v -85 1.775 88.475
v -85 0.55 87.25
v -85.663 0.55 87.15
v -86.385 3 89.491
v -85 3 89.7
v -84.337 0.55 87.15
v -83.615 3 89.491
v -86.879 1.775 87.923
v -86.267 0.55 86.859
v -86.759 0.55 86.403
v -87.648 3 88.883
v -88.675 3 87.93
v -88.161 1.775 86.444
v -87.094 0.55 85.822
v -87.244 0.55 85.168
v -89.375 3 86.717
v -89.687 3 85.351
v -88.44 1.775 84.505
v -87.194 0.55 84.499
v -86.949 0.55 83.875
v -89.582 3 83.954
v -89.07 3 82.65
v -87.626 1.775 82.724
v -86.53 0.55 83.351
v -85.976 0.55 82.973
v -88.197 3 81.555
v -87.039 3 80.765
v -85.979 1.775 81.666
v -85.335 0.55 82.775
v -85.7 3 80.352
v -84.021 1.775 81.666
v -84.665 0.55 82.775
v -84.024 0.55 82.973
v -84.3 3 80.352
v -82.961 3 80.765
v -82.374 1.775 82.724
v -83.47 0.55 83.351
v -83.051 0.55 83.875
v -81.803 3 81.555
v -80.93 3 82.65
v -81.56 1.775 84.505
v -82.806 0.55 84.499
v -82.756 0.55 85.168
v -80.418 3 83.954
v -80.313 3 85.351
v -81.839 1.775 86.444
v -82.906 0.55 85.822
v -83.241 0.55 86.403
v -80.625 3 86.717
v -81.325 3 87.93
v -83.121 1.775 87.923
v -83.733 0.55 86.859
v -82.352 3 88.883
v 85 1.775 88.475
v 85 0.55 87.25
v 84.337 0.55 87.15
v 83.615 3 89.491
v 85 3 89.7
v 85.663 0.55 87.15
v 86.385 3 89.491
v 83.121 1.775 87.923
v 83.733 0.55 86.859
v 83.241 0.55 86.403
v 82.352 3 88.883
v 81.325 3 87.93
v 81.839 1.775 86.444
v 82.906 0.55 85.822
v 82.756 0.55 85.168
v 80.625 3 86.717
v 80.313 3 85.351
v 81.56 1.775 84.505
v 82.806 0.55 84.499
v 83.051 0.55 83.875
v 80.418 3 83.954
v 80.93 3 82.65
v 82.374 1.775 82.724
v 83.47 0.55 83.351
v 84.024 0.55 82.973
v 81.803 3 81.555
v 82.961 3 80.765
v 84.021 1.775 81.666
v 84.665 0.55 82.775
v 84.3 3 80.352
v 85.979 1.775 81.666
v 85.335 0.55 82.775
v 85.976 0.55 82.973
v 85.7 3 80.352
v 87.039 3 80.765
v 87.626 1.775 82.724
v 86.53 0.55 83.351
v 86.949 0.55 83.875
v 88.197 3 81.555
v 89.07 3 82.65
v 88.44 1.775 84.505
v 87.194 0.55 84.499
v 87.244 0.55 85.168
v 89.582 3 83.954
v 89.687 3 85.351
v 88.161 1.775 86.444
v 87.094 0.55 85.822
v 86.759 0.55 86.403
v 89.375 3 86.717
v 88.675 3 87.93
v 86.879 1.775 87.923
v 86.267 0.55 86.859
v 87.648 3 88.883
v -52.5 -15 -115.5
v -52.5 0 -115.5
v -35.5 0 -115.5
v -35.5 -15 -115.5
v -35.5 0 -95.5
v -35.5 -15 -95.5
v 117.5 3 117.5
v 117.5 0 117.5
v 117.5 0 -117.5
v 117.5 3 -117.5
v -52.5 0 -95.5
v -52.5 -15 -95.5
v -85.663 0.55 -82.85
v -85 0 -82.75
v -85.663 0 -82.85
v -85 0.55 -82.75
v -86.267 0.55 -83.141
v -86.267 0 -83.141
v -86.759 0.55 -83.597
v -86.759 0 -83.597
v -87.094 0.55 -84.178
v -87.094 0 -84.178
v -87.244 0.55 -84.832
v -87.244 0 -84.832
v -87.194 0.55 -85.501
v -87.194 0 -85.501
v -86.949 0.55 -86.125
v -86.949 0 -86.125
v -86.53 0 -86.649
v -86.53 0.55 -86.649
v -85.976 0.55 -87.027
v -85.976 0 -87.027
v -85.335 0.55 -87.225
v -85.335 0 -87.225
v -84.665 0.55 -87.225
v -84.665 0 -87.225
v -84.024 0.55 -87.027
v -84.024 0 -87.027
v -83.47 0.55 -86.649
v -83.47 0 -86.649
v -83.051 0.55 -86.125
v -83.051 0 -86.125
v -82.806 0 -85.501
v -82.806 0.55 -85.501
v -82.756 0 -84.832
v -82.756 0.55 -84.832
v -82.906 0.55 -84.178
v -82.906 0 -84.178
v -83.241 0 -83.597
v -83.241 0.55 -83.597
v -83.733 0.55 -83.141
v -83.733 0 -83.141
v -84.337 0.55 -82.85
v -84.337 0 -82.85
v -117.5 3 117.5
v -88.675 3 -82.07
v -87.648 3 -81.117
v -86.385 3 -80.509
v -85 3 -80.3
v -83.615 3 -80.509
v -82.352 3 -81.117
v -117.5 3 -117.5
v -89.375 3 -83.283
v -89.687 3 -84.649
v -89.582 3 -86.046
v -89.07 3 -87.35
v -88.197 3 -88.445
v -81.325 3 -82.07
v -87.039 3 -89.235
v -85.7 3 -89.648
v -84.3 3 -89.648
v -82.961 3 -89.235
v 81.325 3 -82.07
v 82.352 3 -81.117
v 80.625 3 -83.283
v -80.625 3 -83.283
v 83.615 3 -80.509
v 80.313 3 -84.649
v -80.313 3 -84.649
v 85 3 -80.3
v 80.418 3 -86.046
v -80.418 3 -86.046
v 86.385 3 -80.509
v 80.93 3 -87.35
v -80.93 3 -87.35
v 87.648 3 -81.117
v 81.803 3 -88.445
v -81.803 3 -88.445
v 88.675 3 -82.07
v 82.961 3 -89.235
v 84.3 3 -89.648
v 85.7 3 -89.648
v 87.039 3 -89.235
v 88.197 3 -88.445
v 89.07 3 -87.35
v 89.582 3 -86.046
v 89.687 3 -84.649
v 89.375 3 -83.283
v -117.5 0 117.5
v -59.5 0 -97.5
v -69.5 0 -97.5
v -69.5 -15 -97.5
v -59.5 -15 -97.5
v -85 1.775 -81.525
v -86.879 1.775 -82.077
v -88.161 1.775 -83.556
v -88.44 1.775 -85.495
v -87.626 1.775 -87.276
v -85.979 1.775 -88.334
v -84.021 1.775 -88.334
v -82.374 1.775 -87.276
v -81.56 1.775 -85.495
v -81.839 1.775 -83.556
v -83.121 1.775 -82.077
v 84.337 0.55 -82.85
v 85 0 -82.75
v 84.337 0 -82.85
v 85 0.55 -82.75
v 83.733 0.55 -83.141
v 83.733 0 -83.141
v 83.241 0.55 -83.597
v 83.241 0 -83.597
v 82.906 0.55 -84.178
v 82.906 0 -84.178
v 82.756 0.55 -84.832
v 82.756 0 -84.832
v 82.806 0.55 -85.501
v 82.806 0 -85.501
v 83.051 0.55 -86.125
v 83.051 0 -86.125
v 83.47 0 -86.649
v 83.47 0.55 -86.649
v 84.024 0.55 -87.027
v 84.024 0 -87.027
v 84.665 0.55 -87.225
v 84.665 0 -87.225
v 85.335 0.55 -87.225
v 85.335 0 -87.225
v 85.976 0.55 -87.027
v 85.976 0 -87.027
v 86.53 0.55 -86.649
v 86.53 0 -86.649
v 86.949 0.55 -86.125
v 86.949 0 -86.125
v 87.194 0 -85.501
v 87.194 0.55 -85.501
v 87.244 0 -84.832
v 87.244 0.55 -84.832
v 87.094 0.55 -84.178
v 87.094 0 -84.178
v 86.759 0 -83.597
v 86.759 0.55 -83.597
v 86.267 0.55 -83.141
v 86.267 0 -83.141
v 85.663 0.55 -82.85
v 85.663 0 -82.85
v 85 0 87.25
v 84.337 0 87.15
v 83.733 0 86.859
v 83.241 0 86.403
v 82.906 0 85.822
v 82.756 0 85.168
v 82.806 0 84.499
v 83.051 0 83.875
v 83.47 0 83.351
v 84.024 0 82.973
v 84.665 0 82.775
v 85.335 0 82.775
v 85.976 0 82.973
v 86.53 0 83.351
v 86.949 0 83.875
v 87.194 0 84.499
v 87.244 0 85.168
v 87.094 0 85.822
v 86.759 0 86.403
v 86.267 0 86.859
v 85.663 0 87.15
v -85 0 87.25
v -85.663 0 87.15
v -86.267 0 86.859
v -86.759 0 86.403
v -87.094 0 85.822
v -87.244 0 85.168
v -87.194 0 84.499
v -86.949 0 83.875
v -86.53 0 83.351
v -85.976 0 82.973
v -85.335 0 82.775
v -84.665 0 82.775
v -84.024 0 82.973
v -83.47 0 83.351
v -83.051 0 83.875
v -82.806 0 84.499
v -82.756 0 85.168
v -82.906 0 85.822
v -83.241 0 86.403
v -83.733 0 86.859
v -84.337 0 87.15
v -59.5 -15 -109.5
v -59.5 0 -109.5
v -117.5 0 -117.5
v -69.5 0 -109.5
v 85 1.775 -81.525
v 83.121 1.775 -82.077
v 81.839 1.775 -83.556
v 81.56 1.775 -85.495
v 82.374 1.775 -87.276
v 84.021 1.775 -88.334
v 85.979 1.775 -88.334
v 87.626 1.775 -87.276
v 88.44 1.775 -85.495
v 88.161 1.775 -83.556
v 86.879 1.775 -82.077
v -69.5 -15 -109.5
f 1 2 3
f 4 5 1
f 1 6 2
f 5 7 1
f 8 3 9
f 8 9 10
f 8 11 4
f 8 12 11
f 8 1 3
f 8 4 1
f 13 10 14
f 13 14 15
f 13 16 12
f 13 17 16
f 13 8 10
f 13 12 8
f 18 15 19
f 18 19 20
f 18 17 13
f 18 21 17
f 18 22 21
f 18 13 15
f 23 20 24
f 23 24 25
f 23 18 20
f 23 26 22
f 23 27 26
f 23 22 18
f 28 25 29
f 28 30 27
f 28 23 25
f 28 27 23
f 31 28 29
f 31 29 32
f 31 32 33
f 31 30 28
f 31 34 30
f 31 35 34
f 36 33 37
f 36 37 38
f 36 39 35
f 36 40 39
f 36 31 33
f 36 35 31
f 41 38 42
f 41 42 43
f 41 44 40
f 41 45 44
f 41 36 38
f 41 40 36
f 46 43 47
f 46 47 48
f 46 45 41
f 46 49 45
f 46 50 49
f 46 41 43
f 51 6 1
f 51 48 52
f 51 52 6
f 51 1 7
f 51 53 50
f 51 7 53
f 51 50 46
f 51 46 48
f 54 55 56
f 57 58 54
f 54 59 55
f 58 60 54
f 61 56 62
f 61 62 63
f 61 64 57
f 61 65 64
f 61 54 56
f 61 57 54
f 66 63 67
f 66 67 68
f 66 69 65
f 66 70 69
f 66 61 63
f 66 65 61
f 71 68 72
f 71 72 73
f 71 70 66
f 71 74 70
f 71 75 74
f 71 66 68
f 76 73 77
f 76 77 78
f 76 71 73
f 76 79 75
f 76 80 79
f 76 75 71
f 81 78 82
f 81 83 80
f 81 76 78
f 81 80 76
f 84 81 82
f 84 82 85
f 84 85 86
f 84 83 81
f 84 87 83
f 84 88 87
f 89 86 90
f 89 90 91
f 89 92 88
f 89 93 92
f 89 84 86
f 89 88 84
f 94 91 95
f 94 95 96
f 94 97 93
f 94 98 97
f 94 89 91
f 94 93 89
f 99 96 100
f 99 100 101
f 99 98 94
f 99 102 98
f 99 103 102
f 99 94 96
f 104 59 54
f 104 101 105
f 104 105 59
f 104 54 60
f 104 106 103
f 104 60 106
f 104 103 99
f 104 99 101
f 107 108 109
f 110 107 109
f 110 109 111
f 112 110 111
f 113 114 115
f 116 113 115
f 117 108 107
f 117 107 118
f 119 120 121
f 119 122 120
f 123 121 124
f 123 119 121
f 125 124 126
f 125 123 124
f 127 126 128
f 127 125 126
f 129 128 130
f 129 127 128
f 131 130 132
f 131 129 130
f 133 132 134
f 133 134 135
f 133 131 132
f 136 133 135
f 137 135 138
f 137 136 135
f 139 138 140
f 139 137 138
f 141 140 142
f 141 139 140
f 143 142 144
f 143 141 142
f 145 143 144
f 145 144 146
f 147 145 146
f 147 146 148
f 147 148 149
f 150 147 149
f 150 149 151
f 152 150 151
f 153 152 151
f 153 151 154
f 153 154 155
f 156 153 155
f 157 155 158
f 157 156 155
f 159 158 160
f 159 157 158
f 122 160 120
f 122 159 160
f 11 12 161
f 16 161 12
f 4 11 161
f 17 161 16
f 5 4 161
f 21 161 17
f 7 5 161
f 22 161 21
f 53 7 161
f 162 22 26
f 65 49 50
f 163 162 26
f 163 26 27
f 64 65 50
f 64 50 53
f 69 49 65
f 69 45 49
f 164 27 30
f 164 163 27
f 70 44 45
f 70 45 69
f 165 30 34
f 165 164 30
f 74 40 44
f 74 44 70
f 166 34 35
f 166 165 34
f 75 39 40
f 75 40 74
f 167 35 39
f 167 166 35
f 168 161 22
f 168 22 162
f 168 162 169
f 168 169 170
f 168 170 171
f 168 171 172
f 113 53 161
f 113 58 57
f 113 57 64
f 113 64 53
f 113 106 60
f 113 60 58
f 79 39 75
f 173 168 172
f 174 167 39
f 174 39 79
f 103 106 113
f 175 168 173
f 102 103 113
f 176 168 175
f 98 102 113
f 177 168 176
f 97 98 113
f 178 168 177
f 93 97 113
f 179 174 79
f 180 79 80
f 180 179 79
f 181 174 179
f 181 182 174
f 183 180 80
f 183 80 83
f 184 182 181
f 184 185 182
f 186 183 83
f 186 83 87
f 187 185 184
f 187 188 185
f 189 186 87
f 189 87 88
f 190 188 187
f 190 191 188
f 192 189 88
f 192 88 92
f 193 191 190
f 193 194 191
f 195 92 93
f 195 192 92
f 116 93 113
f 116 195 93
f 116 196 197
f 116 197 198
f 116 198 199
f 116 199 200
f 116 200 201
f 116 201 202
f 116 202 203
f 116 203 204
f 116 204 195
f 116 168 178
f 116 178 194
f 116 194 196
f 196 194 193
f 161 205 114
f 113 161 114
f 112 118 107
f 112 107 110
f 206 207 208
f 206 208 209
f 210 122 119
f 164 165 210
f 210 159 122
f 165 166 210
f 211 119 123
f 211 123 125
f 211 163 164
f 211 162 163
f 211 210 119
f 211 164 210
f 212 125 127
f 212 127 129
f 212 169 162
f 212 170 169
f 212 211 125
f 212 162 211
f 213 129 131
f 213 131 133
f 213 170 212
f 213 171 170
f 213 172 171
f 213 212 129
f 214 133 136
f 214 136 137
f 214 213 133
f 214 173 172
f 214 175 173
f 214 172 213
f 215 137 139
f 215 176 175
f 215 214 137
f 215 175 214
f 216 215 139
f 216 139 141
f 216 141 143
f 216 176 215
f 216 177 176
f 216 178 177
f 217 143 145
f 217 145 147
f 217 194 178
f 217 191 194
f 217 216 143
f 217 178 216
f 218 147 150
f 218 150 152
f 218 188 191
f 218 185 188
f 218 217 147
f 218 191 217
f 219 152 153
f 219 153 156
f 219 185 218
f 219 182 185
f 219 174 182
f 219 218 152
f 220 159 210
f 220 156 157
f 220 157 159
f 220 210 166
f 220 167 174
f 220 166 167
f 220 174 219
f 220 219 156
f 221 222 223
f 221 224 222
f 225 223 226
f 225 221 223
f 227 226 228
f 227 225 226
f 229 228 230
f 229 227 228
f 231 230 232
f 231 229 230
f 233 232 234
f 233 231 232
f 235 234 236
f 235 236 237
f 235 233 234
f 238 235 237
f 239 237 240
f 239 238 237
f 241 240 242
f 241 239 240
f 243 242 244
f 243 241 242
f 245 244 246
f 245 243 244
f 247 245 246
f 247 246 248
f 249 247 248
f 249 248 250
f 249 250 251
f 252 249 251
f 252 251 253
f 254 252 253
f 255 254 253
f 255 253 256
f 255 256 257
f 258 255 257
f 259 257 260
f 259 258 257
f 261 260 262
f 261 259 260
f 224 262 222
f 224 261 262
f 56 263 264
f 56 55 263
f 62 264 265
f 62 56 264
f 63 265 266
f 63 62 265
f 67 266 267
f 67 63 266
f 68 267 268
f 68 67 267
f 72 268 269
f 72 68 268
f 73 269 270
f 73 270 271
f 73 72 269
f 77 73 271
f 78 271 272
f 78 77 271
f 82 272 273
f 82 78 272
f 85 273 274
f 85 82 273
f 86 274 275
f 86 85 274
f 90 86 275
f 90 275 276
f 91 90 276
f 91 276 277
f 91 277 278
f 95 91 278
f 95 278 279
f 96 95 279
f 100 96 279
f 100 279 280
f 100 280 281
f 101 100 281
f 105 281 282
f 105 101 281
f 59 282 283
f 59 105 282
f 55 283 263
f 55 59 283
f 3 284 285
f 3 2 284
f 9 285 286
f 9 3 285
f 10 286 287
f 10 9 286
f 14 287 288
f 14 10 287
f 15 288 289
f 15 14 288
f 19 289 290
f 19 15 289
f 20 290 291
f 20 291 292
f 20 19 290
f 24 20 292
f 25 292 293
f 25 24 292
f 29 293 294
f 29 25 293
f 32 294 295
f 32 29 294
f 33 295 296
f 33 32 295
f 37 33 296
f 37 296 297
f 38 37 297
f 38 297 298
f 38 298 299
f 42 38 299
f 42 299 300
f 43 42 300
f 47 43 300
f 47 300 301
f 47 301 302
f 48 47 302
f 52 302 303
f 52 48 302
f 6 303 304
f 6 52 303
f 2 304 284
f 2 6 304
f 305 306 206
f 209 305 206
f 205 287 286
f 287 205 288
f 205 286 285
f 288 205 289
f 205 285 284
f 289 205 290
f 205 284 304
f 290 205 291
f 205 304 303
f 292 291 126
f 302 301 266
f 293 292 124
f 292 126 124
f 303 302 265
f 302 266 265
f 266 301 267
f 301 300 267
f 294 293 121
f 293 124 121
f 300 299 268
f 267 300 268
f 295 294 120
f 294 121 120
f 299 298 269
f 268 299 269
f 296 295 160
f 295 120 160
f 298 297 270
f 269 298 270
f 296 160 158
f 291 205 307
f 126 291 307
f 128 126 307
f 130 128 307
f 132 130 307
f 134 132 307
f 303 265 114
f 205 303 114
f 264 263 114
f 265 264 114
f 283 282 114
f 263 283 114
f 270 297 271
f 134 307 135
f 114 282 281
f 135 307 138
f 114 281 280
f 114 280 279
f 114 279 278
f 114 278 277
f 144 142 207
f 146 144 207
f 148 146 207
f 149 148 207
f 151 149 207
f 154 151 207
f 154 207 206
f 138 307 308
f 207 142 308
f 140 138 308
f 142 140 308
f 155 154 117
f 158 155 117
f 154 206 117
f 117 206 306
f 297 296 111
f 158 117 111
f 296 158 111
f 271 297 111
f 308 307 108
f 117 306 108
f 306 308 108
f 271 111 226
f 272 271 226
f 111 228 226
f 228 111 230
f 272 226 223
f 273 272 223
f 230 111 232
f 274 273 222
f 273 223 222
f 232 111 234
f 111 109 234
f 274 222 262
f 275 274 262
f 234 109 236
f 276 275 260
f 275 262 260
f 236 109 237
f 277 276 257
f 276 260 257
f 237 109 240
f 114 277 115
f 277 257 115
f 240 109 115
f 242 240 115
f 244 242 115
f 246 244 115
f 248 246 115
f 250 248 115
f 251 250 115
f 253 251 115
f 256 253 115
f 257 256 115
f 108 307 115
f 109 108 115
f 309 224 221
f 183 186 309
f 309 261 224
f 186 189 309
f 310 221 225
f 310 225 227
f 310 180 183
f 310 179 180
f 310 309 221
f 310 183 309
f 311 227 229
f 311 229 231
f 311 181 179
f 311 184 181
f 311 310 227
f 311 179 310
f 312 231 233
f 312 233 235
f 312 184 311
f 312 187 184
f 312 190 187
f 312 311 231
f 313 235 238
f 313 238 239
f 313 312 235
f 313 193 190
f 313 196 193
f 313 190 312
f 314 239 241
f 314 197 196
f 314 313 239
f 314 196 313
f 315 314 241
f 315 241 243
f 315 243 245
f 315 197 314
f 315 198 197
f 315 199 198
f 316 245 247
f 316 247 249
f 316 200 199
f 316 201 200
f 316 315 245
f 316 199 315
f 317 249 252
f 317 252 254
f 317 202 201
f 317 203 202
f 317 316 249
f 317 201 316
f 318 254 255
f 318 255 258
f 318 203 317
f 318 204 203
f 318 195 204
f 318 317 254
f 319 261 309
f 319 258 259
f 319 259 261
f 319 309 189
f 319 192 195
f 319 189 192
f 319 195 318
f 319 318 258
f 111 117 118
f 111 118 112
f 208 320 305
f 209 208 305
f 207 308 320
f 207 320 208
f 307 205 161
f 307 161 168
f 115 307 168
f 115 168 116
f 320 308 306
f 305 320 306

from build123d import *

# Parameters (mm, degrees)
SKETCH1_W                                      = 235
SKETCH1_H                                      = 235
BOSS_EXTRUDE1_DEPTH                            = 3
CSK_FOR_M4_FLAT_HEAD_MACHINE_SCREW1_AT_2_COUNT = 2
CSK_FOR_M4_FLAT_HEAD_MACHINE_SCREW1_AT_2_PITCH = 170
CSK_FOR_M4_FLAT_HEAD_MACHINE_SCREW1_AT_3_COUNT = 2
CSK_FOR_M4_FLAT_HEAD_MACHINE_SCREW1_AT_3_PITCH = 240.416305603
CSK_FOR_M4_FLAT_HEAD_MACHINE_SCREW1_AT_4_COUNT = 2
CSK_FOR_M4_FLAT_HEAD_MACHINE_SCREW1_AT_4_PITCH = 170
SKETCH9_W                                      = 10
SKETCH9_H                                      = 12
SKETCH9_W_2                                    = 17
SKETCH9_H_2                                    = 20
BOSS_EXTRUDE5_DEPTH                            = 15


with BuildPart() as part:
    # Sketch1 → Boss-Extrude1 (new body)
    with BuildSketch(Plane(origin=(0, 0, 0), x_dir=(1, 0, 0), z_dir=(0, 1, 0))):
        Rectangle(SKETCH1_W, SKETCH1_H)
    extrude(amount=BOSS_EXTRUDE1_DEPTH)

    # Sketch3 → CSK for M4 Flat Head Machine Screw1 (revolve, cut)
    with BuildSketch(Plane(origin=(-85, 3, -85), x_dir=(0, 0, 1), z_dir=(1, 0, 0))):
        Polygon((0, 0), (0, 3), (2.25, 3), (2.25, 2.45), (4.7, 0), align=None)
    csk_for_m4_flat_head_machine_screw1 = revolve(axis=Axis((-85, 9.35, -85), (0, -1, 0)), mode=Mode.SUBTRACT)

    # CSK for M4 Flat Head Machine Screw1 at 2: CSK for M4 Flat Head Machine Screw1 ×2
    with Locations(*[(i * CSK_FOR_M4_FLAT_HEAD_MACHINE_SCREW1_AT_2_PITCH, 0, 0) for i in range(1, CSK_FOR_M4_FLAT_HEAD_MACHINE_SCREW1_AT_2_COUNT)]):
        add(csk_for_m4_flat_head_machine_screw1, mode=Mode.SUBTRACT)

    # CSK for M4 Flat Head Machine Screw1 at 3: CSK for M4 Flat Head Machine Screw1 ×2
    with Locations(*[Vector(0.707106781, 0, 0.707106781) * (i * CSK_FOR_M4_FLAT_HEAD_MACHINE_SCREW1_AT_3_PITCH) for i in range(1, CSK_FOR_M4_FLAT_HEAD_MACHINE_SCREW1_AT_3_COUNT)]):
        add(csk_for_m4_flat_head_machine_screw1, mode=Mode.SUBTRACT)

    # CSK for M4 Flat Head Machine Screw1 at 4: CSK for M4 Flat Head Machine Screw1 ×2
    with Locations(*[(0, 0, i * CSK_FOR_M4_FLAT_HEAD_MACHINE_SCREW1_AT_4_PITCH) for i in range(1, CSK_FOR_M4_FLAT_HEAD_MACHINE_SCREW1_AT_4_COUNT)]):
        add(csk_for_m4_flat_head_machine_screw1, mode=Mode.SUBTRACT)

    # Sketch9 → Boss-Extrude5 (add)
    with BuildSketch(Plane.XZ):
        with Locations((-64.5, -103.5)):
            Rectangle(SKETCH9_W, SKETCH9_H)
        with Locations((-44, -105.5)):
            Rectangle(SKETCH9_W_2, SKETCH9_H_2)
    extrude(amount=BOSS_EXTRUDE5_DEPTH)


solid = part.part
